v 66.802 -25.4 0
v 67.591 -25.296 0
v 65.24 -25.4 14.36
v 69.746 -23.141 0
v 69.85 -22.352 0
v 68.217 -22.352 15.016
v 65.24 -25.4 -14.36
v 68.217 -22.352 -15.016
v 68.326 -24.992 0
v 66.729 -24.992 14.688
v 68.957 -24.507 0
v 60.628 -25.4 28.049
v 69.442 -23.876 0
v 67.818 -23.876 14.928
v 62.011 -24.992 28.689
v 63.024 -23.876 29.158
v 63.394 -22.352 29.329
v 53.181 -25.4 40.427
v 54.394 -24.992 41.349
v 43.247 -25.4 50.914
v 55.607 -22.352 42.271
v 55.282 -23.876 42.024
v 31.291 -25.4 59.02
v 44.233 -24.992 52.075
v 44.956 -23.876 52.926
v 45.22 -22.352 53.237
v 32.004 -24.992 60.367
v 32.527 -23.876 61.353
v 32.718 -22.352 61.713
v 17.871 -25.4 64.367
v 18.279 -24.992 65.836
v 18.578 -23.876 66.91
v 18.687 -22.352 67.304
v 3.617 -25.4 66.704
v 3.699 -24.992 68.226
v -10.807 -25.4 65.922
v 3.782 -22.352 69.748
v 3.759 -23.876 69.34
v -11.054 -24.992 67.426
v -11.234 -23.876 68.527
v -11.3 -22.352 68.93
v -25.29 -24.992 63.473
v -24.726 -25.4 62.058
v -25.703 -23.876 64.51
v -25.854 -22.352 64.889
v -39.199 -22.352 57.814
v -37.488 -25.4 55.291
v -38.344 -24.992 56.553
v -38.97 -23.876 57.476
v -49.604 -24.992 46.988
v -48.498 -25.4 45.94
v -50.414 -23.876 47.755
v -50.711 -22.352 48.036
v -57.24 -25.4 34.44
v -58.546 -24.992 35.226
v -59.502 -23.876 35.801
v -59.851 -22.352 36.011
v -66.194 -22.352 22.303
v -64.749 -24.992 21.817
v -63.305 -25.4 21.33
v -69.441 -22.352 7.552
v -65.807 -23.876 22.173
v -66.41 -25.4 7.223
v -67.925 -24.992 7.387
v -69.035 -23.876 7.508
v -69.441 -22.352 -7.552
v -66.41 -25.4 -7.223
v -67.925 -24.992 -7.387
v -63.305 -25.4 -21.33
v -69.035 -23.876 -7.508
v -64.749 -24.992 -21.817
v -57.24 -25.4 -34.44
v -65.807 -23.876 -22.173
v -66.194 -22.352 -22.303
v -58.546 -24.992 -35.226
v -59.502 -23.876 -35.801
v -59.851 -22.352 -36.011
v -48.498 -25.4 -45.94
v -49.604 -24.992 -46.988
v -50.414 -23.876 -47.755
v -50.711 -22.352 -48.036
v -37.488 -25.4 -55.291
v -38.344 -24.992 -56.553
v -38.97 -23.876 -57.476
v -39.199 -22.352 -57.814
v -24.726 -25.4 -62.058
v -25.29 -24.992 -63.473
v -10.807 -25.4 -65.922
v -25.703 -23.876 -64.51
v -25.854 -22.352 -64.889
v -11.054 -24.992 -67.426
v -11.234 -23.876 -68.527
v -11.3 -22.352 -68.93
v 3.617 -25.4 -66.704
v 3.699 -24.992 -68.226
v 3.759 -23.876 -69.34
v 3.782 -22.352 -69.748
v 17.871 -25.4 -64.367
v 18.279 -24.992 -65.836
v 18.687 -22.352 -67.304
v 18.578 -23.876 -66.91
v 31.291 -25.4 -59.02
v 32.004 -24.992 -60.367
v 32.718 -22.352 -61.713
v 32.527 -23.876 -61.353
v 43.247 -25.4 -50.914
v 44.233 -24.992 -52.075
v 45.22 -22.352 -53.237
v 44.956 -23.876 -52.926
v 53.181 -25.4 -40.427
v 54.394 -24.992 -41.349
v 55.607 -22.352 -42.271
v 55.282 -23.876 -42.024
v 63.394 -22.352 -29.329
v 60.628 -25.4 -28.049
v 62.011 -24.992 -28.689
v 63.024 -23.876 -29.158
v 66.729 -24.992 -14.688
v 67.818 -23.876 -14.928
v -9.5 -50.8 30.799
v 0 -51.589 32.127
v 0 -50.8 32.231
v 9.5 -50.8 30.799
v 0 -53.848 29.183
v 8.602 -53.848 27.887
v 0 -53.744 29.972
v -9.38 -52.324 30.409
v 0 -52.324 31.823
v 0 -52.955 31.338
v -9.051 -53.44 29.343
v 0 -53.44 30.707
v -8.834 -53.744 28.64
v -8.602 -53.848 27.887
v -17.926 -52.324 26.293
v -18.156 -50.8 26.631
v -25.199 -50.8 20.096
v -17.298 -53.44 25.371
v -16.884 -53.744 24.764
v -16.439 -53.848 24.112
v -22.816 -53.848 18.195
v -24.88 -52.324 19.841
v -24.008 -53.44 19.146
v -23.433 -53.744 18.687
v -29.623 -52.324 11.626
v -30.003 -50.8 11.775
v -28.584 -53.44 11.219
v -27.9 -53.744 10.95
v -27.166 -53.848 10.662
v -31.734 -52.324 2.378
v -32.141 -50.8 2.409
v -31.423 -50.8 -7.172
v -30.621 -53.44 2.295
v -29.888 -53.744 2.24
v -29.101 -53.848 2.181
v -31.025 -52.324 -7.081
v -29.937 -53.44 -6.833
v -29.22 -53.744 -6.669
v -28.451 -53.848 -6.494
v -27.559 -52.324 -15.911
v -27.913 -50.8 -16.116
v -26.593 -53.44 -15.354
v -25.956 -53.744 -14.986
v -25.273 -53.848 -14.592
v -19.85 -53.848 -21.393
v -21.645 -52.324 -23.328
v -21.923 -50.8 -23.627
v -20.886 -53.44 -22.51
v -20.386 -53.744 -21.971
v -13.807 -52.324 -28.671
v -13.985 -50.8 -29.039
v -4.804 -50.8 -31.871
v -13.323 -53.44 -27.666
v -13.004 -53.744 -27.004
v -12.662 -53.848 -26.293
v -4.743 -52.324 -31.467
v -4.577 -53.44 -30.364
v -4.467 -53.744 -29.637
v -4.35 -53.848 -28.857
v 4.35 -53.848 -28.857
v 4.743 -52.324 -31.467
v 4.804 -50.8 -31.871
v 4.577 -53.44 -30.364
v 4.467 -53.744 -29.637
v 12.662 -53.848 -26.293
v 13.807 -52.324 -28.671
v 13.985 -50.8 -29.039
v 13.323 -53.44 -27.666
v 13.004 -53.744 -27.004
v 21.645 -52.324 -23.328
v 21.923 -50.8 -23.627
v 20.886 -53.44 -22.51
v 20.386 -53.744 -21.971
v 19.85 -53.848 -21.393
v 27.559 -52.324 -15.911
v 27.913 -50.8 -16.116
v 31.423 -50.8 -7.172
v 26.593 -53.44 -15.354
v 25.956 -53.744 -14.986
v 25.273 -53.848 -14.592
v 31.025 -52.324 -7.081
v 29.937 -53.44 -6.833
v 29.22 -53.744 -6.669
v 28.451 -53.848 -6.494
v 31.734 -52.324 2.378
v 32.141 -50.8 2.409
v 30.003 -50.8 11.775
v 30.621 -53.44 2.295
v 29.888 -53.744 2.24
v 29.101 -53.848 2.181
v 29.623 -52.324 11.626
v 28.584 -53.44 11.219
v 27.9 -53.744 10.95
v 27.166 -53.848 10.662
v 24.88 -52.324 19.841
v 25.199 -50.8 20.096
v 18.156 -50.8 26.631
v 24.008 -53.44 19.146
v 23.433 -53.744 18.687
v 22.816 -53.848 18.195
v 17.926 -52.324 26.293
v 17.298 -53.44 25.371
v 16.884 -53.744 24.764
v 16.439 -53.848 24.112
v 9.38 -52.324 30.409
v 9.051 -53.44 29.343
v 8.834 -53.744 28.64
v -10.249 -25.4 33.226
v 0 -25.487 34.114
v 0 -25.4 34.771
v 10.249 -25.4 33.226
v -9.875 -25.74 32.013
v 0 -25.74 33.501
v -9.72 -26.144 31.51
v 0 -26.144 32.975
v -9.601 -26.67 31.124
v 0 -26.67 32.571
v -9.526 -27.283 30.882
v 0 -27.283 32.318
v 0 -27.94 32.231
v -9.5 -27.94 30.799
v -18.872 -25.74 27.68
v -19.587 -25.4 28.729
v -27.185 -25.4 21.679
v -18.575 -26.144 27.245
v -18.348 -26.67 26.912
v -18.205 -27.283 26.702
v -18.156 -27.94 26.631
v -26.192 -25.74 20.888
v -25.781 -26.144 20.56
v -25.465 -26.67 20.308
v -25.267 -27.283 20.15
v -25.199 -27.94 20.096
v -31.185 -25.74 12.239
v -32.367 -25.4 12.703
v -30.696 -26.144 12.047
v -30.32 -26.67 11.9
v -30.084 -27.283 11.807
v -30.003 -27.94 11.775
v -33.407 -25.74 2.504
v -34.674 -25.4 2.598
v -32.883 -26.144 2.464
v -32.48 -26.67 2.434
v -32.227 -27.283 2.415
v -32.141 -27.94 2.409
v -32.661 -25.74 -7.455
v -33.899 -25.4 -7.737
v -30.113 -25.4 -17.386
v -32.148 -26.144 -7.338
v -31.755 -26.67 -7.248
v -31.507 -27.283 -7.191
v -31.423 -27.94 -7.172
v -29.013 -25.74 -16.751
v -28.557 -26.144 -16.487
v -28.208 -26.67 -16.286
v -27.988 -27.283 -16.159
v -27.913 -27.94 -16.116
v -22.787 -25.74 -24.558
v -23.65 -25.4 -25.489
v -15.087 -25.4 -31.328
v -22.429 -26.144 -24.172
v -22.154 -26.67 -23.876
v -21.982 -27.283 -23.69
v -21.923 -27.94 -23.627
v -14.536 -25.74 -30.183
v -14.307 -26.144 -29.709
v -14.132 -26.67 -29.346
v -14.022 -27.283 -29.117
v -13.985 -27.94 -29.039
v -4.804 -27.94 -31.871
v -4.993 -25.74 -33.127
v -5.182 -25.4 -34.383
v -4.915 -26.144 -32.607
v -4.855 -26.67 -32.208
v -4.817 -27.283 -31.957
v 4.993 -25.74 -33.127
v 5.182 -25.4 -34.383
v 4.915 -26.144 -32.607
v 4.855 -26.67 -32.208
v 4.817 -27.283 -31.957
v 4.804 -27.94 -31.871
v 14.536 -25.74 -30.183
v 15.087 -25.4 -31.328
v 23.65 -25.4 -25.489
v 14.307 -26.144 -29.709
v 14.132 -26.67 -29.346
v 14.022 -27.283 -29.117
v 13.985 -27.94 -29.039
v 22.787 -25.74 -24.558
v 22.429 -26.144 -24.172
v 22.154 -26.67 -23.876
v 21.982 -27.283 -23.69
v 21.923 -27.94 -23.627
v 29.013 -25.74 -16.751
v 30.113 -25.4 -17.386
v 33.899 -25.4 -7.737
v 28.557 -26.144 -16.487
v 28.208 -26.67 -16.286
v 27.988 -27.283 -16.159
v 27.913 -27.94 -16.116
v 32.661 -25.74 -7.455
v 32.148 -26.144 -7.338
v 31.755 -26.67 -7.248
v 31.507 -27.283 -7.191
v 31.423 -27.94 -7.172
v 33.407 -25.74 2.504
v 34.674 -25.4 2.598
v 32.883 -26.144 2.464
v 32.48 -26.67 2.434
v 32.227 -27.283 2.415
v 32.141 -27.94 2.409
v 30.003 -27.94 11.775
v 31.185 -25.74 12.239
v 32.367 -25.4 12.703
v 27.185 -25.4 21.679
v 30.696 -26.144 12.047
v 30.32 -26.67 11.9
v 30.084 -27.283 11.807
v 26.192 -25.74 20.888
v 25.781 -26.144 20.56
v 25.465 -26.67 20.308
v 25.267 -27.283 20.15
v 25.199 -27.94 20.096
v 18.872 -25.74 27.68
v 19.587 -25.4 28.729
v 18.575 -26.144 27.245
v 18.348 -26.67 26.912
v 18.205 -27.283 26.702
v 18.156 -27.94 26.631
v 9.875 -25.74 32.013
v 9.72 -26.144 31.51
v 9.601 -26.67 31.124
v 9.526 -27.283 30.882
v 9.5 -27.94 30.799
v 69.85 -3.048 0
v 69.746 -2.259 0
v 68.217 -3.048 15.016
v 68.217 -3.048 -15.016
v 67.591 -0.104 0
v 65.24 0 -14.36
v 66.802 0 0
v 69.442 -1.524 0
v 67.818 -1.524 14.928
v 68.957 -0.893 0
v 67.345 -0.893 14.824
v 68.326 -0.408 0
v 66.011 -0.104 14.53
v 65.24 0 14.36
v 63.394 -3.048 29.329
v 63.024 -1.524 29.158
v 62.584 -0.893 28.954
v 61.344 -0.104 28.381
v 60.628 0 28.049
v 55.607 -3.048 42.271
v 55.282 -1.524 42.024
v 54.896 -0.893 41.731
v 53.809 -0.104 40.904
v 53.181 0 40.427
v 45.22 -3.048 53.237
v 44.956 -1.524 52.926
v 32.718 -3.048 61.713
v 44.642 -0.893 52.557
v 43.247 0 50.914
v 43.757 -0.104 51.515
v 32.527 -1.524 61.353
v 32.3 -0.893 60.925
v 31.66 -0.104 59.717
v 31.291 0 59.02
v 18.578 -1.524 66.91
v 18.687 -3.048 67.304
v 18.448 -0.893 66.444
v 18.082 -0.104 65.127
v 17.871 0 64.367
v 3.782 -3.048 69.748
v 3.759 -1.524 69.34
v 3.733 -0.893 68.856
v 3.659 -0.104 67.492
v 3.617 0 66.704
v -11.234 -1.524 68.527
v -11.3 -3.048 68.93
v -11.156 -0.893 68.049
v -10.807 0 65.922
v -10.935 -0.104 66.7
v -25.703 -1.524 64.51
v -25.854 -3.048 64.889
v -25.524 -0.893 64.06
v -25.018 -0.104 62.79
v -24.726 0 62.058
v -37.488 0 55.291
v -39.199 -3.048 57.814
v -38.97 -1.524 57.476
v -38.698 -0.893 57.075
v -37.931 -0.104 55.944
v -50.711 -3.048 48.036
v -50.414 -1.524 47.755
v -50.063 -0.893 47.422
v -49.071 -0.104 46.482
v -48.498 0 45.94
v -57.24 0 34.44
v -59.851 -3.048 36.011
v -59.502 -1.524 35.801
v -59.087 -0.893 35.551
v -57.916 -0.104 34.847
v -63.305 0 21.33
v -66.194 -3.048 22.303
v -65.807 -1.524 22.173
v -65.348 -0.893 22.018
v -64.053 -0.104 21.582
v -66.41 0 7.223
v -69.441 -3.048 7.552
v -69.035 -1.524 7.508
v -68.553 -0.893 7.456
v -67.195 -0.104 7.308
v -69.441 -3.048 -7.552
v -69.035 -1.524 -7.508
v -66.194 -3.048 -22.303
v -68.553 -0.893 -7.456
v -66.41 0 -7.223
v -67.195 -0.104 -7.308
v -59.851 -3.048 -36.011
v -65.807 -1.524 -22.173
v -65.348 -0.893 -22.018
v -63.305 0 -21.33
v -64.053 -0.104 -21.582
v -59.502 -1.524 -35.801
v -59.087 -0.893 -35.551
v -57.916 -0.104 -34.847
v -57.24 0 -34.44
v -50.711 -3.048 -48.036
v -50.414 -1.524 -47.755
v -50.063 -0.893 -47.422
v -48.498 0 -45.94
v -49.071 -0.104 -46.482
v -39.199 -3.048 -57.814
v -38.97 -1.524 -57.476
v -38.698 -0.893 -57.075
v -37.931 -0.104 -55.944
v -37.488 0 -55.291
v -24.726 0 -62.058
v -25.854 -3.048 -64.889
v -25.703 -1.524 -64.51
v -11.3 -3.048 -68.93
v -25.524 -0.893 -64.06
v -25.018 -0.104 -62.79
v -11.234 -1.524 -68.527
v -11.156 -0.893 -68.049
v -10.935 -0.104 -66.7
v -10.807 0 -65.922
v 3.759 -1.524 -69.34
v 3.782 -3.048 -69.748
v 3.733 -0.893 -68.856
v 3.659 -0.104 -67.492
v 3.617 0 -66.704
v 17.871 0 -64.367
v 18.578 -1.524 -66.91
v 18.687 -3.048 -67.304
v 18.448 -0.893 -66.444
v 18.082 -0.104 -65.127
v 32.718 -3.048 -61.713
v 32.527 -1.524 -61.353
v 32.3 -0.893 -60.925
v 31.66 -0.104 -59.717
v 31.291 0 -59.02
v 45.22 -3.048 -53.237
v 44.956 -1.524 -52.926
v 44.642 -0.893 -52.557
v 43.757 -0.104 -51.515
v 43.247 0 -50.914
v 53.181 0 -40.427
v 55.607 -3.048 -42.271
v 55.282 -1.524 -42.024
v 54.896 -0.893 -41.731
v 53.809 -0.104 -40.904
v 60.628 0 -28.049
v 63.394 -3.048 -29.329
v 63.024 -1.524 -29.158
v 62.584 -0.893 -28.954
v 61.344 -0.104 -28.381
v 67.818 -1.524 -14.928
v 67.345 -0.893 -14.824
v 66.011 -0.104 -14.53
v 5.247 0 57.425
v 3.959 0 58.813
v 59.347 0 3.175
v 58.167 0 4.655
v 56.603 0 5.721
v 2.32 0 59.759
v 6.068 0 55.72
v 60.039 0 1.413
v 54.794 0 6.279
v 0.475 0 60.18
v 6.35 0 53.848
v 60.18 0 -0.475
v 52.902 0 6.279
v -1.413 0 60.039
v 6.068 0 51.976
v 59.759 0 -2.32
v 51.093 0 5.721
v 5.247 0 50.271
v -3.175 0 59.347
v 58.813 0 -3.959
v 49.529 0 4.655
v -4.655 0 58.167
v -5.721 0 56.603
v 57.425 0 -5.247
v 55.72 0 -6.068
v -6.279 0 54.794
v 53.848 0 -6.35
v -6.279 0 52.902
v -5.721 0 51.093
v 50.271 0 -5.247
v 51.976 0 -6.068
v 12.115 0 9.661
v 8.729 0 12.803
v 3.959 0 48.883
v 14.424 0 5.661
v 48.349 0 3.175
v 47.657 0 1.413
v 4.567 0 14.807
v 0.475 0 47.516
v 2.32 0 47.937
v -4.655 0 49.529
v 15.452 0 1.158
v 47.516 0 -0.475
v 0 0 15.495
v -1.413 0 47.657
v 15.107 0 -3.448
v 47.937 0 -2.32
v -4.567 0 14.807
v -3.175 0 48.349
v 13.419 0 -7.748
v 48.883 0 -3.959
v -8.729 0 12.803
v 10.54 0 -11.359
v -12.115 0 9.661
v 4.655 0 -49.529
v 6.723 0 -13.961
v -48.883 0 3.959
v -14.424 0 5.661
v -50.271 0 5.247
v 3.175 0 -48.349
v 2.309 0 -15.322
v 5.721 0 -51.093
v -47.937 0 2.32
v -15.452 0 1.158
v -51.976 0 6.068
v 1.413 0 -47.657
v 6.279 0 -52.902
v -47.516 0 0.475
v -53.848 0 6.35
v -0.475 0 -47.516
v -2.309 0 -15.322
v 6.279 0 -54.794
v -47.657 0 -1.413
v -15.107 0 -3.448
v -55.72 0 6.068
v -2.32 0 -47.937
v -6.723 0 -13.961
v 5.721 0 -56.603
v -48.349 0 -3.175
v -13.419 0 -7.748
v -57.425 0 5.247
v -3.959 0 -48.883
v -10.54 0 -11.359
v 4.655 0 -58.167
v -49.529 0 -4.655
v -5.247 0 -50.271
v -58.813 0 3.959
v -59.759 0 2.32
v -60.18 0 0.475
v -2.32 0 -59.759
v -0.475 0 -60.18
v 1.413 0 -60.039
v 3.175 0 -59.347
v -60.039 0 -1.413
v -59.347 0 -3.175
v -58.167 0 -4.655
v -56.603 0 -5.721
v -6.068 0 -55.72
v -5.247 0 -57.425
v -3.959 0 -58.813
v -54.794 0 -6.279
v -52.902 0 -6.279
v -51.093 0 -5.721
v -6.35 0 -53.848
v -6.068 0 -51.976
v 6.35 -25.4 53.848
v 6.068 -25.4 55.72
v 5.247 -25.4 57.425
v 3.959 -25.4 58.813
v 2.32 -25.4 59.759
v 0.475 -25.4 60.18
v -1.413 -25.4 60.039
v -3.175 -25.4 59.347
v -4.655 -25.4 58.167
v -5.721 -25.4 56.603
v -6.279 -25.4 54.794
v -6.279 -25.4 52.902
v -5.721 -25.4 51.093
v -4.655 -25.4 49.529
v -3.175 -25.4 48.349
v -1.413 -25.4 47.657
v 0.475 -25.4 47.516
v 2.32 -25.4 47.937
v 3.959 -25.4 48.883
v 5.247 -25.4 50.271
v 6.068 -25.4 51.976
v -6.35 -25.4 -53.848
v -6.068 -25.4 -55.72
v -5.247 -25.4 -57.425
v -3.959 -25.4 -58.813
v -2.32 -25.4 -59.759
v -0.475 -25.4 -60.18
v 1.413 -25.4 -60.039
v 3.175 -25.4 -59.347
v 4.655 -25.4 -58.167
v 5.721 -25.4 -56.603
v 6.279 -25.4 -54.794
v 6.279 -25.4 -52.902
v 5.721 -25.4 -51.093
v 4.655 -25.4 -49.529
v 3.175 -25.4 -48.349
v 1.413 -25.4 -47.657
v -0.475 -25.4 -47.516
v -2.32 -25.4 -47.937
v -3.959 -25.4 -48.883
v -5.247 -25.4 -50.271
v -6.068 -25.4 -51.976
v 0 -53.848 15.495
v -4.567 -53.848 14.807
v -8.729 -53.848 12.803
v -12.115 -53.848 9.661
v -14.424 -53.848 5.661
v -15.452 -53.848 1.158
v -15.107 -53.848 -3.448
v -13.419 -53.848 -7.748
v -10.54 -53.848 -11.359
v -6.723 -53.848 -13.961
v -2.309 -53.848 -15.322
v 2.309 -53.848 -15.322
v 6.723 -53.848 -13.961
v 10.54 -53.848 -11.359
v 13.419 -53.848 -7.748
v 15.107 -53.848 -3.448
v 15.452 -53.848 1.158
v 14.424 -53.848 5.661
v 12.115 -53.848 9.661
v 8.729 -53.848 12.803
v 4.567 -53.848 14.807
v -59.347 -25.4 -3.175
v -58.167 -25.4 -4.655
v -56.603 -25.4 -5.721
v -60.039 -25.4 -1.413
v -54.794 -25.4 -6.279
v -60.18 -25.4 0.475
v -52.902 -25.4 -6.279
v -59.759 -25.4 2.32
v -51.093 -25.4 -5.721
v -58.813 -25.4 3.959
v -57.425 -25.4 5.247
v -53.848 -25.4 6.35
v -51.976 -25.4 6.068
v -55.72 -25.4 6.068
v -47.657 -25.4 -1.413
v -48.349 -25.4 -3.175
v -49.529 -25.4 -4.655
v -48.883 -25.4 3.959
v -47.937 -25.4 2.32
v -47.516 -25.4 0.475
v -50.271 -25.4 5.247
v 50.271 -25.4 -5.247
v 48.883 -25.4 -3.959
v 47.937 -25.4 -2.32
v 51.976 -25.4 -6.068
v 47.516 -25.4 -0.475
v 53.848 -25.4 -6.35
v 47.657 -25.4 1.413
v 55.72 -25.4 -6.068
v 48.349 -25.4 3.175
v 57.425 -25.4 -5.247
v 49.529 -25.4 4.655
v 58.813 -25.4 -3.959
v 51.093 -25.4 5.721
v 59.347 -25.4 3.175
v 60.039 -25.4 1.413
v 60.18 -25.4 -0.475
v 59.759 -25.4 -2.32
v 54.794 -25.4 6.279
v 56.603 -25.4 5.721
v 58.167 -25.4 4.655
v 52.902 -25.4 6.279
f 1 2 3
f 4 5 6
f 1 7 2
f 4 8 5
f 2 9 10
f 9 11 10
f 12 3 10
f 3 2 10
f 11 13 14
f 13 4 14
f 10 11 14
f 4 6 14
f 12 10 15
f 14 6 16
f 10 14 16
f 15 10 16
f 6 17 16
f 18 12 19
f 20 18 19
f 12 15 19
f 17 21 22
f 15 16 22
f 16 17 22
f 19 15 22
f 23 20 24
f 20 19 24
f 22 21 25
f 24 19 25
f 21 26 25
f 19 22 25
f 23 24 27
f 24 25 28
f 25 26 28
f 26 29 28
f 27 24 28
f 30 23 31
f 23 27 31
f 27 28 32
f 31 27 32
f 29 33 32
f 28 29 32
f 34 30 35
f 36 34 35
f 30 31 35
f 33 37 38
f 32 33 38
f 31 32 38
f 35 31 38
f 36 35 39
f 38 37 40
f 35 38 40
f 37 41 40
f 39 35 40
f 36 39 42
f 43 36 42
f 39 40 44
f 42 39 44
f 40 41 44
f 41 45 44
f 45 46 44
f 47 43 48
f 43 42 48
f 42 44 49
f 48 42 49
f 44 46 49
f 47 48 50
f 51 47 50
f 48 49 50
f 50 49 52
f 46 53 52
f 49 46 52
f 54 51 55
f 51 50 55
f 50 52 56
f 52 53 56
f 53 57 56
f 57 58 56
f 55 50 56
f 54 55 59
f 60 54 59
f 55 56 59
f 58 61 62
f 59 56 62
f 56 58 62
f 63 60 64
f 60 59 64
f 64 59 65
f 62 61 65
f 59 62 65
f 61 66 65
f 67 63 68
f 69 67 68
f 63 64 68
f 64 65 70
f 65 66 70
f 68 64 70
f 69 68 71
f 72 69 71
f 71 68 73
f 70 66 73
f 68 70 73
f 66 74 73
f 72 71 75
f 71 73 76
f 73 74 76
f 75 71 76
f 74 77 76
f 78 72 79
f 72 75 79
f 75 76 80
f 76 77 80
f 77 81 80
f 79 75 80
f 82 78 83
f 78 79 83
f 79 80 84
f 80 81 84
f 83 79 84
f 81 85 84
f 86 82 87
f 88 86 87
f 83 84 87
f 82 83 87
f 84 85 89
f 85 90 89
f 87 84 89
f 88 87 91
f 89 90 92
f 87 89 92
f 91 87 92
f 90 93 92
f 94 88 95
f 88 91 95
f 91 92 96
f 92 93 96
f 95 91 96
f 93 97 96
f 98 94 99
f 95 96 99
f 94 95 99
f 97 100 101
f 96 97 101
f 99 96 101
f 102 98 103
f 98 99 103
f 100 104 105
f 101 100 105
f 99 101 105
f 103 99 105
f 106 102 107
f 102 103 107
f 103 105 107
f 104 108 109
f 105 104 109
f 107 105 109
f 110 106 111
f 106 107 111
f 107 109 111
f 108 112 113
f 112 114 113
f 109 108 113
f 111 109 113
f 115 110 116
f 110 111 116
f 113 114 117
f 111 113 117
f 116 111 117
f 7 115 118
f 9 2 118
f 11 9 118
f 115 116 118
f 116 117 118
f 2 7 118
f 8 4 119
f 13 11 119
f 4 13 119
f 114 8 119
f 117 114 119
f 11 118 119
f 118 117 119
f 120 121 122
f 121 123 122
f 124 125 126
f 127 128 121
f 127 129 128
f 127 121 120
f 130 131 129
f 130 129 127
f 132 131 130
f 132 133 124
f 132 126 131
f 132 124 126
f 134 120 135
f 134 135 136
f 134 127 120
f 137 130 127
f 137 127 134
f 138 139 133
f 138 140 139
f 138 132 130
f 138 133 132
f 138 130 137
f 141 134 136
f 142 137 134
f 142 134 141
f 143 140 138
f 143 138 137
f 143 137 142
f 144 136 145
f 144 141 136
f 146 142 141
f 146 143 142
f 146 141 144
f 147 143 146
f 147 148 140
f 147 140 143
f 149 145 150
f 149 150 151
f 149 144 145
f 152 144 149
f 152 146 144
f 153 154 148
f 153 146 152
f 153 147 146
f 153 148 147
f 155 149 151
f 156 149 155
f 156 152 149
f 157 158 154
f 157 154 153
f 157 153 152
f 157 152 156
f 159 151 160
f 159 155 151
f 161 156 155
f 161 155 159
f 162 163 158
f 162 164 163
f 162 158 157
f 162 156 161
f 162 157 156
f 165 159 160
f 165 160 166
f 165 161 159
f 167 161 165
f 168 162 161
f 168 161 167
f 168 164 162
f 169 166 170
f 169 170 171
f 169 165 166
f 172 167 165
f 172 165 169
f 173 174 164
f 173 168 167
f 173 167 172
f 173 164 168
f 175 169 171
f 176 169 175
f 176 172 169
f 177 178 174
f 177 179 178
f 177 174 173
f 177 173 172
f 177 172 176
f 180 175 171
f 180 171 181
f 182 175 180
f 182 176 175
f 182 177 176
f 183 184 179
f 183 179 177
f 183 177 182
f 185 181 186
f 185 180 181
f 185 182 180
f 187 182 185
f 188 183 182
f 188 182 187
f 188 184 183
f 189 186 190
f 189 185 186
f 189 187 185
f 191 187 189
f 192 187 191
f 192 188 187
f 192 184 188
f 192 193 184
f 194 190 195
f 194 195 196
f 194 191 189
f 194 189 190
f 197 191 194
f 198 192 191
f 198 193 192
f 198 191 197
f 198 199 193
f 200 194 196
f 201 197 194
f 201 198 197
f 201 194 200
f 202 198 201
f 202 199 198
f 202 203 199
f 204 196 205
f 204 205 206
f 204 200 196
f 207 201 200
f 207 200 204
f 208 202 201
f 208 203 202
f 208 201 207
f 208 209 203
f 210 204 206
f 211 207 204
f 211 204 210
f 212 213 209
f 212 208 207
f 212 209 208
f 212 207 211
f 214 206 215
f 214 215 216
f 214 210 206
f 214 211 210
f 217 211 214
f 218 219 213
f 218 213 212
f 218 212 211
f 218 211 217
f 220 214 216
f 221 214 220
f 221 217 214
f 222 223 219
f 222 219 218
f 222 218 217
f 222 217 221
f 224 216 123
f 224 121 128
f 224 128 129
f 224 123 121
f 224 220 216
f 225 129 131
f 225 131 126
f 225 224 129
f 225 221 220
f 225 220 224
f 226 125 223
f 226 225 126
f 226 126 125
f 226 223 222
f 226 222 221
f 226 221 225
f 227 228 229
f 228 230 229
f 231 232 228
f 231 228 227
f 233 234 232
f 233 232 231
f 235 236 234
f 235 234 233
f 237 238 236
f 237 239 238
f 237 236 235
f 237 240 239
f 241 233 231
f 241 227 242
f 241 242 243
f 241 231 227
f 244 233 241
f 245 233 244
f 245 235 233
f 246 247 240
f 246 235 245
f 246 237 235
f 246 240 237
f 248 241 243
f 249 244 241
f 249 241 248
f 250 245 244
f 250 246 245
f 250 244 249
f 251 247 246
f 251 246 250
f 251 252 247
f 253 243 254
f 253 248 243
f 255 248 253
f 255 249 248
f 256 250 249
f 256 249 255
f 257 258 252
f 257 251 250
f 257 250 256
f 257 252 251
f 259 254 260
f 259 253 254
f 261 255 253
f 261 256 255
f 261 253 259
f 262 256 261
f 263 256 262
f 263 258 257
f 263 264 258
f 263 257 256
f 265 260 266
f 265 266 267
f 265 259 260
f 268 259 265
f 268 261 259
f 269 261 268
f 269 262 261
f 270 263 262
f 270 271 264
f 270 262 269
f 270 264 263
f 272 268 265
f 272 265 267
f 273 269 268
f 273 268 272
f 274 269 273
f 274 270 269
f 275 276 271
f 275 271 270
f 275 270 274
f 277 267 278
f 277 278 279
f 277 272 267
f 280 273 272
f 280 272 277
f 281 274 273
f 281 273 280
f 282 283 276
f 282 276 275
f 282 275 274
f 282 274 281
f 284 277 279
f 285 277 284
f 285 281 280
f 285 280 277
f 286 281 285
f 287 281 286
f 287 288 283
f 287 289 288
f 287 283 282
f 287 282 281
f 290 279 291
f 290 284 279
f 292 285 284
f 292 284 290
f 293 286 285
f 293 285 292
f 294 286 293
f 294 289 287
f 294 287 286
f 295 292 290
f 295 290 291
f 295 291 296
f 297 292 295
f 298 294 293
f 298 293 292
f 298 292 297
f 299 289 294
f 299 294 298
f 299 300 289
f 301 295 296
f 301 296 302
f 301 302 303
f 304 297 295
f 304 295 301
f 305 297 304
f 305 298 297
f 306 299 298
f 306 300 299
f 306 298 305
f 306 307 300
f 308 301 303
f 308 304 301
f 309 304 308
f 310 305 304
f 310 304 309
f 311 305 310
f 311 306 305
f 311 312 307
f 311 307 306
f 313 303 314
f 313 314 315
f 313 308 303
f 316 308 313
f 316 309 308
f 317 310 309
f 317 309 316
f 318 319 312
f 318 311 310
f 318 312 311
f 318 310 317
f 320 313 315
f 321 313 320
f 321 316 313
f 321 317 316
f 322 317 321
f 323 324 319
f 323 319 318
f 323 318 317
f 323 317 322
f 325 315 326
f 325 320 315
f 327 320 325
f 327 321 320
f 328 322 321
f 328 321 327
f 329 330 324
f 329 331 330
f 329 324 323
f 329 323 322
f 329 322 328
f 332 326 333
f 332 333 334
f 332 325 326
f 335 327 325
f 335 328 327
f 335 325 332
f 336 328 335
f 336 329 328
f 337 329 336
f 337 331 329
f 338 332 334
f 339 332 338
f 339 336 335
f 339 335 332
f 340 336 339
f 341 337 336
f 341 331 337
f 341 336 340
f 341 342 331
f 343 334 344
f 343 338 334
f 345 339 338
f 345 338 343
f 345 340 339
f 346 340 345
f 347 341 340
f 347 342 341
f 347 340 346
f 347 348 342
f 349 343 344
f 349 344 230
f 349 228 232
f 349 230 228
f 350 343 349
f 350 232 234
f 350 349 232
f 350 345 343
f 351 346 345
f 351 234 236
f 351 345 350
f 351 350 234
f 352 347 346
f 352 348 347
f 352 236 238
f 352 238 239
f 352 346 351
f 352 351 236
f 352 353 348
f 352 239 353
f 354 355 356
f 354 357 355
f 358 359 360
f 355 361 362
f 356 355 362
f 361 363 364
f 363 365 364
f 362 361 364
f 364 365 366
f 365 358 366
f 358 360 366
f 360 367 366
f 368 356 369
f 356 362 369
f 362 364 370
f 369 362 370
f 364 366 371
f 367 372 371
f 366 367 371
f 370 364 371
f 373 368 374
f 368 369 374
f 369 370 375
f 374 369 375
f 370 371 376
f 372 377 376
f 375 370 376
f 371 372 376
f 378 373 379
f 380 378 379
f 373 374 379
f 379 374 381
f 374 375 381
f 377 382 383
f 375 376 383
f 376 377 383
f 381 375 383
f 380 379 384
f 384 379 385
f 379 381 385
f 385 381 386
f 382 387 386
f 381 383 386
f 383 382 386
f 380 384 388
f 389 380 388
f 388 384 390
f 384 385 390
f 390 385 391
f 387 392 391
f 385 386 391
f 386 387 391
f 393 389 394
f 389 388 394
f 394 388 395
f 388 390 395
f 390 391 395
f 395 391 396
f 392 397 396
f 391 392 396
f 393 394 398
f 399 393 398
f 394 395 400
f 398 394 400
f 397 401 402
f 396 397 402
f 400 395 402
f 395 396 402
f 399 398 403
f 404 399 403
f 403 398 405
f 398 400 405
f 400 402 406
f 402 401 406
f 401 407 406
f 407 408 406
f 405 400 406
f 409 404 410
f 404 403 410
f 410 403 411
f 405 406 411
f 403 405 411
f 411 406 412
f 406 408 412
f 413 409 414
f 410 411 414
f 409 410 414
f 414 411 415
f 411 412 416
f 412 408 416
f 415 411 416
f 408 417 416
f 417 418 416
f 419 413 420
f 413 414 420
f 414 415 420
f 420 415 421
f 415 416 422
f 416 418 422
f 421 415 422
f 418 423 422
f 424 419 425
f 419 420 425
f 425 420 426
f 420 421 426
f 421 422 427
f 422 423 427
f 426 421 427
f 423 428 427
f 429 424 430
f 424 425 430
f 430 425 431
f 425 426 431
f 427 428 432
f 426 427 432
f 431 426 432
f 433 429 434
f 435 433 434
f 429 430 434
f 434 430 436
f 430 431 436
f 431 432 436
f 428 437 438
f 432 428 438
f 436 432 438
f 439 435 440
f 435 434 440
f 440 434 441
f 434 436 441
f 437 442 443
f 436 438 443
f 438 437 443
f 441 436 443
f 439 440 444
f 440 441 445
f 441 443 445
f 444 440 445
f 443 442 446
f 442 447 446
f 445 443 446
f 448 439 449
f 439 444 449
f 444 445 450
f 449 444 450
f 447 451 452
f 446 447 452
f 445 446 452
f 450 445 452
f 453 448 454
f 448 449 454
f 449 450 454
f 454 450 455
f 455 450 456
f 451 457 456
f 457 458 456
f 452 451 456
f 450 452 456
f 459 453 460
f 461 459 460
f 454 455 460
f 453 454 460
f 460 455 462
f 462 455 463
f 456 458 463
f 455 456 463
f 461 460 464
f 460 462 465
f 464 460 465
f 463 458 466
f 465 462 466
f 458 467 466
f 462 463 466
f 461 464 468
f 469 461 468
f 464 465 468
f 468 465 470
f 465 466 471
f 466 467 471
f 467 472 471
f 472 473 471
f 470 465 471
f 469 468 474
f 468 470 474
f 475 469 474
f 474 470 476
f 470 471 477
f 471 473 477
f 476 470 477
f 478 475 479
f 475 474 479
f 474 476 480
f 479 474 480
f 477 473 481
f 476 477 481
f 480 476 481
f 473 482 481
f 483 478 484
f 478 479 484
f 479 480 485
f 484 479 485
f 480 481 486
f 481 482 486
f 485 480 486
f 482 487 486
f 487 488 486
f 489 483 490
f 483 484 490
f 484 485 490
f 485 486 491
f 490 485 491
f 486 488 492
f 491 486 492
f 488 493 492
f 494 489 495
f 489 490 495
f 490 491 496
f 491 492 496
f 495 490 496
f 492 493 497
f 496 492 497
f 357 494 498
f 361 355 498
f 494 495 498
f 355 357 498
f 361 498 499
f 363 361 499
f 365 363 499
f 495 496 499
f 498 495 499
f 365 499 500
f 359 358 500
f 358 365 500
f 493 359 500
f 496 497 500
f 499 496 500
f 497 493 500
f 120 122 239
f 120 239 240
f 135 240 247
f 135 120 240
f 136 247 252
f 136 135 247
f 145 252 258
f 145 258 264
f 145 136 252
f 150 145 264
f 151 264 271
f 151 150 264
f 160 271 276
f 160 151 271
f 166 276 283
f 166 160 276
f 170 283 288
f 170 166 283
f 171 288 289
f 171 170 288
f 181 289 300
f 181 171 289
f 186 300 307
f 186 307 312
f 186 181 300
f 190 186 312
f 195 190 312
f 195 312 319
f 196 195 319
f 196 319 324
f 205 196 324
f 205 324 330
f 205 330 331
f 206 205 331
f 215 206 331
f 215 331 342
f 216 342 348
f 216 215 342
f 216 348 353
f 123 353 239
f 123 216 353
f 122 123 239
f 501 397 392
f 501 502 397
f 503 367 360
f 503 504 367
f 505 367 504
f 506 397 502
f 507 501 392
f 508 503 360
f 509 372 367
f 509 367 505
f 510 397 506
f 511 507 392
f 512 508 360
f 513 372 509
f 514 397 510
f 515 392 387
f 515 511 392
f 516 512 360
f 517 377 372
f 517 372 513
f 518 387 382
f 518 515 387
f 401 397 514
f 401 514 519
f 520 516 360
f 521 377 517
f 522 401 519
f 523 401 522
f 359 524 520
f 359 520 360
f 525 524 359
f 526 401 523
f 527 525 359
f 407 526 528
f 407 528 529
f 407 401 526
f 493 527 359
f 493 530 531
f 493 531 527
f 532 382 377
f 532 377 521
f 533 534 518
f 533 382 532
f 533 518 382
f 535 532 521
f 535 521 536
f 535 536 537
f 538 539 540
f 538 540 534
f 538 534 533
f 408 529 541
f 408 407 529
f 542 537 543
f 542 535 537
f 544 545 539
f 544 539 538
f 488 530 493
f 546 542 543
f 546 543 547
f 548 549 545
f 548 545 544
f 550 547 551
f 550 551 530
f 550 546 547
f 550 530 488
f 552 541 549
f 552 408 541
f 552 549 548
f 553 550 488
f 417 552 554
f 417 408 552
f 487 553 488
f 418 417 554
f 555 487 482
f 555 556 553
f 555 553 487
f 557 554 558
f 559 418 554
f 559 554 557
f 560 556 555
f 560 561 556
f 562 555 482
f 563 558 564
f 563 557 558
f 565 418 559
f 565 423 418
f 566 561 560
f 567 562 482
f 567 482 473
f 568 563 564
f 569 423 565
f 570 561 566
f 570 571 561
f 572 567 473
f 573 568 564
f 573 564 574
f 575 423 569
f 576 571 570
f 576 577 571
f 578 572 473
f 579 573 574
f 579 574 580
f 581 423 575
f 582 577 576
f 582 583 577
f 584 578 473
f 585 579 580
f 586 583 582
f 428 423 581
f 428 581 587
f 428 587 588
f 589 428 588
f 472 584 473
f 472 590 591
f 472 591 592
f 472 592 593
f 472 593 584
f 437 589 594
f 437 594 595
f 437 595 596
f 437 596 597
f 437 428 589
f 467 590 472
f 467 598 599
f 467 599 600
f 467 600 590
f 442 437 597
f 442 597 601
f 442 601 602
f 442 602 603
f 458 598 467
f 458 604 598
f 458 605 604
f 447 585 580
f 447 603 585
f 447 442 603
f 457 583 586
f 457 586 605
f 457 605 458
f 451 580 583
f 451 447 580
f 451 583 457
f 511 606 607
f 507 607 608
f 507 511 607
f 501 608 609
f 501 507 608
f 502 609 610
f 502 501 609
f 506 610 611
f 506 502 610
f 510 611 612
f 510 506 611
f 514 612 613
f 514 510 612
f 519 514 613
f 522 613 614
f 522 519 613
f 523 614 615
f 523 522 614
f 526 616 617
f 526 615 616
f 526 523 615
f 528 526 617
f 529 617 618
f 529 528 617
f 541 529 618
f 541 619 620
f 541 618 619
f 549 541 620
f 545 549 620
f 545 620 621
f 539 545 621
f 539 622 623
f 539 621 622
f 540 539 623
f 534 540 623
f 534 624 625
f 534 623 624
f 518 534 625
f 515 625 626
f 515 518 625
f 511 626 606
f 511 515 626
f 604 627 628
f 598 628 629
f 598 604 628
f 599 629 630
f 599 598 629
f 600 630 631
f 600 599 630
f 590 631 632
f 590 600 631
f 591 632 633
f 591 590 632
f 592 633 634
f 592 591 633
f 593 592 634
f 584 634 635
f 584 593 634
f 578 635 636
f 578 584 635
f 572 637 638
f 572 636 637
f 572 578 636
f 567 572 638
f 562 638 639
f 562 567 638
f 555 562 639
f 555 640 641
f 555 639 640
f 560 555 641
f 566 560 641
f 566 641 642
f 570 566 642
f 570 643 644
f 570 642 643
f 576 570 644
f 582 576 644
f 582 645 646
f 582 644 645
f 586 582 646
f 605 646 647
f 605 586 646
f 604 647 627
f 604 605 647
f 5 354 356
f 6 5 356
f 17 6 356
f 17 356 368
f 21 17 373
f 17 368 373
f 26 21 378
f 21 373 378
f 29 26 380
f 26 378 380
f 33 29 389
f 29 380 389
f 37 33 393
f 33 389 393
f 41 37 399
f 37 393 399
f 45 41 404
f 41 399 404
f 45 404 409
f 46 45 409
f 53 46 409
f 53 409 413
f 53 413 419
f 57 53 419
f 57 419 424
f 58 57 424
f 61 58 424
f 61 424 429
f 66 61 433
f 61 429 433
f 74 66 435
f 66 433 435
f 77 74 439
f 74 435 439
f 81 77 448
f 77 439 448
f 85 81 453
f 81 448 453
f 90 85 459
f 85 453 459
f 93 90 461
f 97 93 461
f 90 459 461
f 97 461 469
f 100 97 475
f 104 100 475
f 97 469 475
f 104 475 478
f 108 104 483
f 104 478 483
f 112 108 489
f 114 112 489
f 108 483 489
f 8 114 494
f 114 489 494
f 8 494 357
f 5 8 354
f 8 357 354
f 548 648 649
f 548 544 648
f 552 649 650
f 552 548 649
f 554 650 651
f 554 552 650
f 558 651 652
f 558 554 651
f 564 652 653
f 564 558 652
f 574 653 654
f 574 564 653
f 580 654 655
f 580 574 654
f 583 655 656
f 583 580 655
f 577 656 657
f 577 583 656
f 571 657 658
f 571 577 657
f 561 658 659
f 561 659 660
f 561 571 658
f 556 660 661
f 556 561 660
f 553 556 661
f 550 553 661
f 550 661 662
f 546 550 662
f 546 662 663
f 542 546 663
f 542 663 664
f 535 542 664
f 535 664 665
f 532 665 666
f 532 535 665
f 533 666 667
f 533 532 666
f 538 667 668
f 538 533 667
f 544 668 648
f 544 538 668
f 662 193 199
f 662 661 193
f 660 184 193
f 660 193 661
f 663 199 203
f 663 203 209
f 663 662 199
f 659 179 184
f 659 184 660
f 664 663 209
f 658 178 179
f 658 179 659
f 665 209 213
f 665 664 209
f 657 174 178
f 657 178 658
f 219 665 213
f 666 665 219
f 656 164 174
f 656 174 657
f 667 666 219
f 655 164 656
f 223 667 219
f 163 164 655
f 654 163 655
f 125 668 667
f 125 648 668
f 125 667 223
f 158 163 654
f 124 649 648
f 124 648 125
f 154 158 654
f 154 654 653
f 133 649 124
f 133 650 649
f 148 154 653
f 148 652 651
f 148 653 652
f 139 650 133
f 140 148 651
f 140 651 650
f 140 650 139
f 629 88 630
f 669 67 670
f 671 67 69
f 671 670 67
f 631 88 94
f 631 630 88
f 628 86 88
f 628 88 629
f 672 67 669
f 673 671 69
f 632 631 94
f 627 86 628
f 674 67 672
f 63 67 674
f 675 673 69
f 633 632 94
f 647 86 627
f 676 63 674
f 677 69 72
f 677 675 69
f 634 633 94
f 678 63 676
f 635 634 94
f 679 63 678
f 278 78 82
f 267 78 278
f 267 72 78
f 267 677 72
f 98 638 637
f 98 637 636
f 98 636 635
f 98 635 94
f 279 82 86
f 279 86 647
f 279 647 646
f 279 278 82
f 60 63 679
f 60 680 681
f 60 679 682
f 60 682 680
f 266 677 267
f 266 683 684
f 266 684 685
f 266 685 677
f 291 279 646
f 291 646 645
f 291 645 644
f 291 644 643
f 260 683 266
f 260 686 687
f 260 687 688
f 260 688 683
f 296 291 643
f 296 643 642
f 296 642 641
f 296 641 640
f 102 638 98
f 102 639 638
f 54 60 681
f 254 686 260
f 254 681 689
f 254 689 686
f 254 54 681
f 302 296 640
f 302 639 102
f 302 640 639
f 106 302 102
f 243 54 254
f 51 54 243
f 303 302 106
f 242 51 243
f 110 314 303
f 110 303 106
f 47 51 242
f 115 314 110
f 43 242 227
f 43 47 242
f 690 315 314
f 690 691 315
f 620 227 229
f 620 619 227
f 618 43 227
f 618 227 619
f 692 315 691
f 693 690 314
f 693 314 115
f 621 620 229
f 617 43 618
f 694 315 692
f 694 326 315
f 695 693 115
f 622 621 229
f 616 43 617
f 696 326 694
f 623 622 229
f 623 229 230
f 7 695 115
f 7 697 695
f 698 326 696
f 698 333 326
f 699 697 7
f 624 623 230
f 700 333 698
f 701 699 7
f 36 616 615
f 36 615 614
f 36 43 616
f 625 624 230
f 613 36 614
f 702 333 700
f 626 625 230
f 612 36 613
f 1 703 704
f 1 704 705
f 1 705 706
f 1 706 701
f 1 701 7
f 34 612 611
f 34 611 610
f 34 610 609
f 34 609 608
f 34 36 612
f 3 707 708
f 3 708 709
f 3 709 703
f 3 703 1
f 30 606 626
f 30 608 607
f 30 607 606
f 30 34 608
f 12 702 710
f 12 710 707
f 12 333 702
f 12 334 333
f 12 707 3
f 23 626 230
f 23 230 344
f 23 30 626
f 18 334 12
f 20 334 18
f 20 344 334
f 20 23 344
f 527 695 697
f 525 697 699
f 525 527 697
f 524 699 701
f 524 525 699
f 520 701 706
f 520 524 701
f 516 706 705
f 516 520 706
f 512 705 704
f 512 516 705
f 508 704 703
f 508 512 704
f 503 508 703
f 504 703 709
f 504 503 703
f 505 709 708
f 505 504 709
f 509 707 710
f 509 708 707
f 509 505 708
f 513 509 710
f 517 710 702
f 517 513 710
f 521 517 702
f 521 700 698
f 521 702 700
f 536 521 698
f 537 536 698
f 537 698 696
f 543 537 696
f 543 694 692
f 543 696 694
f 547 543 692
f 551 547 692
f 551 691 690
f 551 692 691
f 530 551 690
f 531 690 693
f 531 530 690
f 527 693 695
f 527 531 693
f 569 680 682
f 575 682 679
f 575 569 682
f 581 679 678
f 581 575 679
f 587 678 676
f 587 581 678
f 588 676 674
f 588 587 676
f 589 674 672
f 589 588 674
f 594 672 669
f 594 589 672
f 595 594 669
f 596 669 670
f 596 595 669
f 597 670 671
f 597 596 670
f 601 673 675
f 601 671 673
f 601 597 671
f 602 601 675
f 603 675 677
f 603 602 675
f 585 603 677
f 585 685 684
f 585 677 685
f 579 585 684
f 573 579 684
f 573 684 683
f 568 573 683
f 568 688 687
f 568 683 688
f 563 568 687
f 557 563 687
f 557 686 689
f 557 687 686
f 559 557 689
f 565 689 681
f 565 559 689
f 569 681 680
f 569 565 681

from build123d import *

# Parameters (mm, degrees)
F0_R            = 69.85
F1_DEPTH        = 25.4
F2_R            = 19.05
F2_R_2          = 6.35
F3_DEPTH        = 25.401
F3_COPIES_COUNT = 4
F6_R            = 3.048
F7_R            = 3.048
F8_R            = 2.54


# Not quite as in the source:
# - a pattern or mirror of a feature is missing from the dataset's text; its kind, count and spacing are read off the source's solid


with BuildPart() as f1:
    # F0 (on Front) → F1 (new body)
    with BuildSketch(Plane.XZ):
        Circle(F0_R)
    extrude(amount=F1_DEPTH)

    # F2 (on Front) → F3 (cut, through all)
    with BuildSketch(Plane.XZ):
        Circle(F2_R)
        with Locations((0, 53.848)):
            Circle(F2_R_2)
    f3 = extrude(amount=F3_DEPTH, mode=Mode.SUBTRACT)

    # F3_copies: F3 ×4 about axis
    f3_copies_axis = Axis((0, 0, 0), (0, 1, 0))
    for i in range(1, F3_COPIES_COUNT):
        add(f3.rotate(f3_copies_axis, i * 360 / F3_COPIES_COUNT), mode=Mode.SUBTRACT)

    # F4 (on Right) → F5 (revolve)
    with BuildSketch(Plane.YZ):
        with BuildLine():
            Line((-53.848, 15.4953468409), (0, 15.4953468409))
            Line((0, 15.4953468409), (0, 32.2310491102))
            Line((0, 32.2310491102), (-25.3001134843, 32.2310491102))
            Line((-25.3001134843, 32.2310491102), (-50.8, 32.2310491102))
            ThreePointArc((-50.8, 32.2310491102), (-52.9552614691, 31.3383105793), (-53.848, 29.1830491102))
            Line((-53.848, 29.1830491102), (-53.848, 15.4953468409))
        make_face()
    revolve(axis=Axis((0, -22.6452342175, 0), (0, -1, 0)))

    # F6
    f6_edges = [f1.edges().sort_by_distance(p)[0] for p in [
        (-69.85, -25.4, 0),
    ]]
    fillet(f6_edges, radius=F6_R)

    # F7
    f7_edges = [f1.edges().sort_by_distance(p)[0] for p in [
        (-69.85, 0, 0),
    ]]
    fillet(f7_edges, radius=F7_R)

    # F8
    f8_edges = [f1.edges().sort_by_distance(p)[0] for p in [
        (0, -25.4, -32.231049),
    ]]
    fillet(f8_edges, radius=F8_R)


solid = f1.part
